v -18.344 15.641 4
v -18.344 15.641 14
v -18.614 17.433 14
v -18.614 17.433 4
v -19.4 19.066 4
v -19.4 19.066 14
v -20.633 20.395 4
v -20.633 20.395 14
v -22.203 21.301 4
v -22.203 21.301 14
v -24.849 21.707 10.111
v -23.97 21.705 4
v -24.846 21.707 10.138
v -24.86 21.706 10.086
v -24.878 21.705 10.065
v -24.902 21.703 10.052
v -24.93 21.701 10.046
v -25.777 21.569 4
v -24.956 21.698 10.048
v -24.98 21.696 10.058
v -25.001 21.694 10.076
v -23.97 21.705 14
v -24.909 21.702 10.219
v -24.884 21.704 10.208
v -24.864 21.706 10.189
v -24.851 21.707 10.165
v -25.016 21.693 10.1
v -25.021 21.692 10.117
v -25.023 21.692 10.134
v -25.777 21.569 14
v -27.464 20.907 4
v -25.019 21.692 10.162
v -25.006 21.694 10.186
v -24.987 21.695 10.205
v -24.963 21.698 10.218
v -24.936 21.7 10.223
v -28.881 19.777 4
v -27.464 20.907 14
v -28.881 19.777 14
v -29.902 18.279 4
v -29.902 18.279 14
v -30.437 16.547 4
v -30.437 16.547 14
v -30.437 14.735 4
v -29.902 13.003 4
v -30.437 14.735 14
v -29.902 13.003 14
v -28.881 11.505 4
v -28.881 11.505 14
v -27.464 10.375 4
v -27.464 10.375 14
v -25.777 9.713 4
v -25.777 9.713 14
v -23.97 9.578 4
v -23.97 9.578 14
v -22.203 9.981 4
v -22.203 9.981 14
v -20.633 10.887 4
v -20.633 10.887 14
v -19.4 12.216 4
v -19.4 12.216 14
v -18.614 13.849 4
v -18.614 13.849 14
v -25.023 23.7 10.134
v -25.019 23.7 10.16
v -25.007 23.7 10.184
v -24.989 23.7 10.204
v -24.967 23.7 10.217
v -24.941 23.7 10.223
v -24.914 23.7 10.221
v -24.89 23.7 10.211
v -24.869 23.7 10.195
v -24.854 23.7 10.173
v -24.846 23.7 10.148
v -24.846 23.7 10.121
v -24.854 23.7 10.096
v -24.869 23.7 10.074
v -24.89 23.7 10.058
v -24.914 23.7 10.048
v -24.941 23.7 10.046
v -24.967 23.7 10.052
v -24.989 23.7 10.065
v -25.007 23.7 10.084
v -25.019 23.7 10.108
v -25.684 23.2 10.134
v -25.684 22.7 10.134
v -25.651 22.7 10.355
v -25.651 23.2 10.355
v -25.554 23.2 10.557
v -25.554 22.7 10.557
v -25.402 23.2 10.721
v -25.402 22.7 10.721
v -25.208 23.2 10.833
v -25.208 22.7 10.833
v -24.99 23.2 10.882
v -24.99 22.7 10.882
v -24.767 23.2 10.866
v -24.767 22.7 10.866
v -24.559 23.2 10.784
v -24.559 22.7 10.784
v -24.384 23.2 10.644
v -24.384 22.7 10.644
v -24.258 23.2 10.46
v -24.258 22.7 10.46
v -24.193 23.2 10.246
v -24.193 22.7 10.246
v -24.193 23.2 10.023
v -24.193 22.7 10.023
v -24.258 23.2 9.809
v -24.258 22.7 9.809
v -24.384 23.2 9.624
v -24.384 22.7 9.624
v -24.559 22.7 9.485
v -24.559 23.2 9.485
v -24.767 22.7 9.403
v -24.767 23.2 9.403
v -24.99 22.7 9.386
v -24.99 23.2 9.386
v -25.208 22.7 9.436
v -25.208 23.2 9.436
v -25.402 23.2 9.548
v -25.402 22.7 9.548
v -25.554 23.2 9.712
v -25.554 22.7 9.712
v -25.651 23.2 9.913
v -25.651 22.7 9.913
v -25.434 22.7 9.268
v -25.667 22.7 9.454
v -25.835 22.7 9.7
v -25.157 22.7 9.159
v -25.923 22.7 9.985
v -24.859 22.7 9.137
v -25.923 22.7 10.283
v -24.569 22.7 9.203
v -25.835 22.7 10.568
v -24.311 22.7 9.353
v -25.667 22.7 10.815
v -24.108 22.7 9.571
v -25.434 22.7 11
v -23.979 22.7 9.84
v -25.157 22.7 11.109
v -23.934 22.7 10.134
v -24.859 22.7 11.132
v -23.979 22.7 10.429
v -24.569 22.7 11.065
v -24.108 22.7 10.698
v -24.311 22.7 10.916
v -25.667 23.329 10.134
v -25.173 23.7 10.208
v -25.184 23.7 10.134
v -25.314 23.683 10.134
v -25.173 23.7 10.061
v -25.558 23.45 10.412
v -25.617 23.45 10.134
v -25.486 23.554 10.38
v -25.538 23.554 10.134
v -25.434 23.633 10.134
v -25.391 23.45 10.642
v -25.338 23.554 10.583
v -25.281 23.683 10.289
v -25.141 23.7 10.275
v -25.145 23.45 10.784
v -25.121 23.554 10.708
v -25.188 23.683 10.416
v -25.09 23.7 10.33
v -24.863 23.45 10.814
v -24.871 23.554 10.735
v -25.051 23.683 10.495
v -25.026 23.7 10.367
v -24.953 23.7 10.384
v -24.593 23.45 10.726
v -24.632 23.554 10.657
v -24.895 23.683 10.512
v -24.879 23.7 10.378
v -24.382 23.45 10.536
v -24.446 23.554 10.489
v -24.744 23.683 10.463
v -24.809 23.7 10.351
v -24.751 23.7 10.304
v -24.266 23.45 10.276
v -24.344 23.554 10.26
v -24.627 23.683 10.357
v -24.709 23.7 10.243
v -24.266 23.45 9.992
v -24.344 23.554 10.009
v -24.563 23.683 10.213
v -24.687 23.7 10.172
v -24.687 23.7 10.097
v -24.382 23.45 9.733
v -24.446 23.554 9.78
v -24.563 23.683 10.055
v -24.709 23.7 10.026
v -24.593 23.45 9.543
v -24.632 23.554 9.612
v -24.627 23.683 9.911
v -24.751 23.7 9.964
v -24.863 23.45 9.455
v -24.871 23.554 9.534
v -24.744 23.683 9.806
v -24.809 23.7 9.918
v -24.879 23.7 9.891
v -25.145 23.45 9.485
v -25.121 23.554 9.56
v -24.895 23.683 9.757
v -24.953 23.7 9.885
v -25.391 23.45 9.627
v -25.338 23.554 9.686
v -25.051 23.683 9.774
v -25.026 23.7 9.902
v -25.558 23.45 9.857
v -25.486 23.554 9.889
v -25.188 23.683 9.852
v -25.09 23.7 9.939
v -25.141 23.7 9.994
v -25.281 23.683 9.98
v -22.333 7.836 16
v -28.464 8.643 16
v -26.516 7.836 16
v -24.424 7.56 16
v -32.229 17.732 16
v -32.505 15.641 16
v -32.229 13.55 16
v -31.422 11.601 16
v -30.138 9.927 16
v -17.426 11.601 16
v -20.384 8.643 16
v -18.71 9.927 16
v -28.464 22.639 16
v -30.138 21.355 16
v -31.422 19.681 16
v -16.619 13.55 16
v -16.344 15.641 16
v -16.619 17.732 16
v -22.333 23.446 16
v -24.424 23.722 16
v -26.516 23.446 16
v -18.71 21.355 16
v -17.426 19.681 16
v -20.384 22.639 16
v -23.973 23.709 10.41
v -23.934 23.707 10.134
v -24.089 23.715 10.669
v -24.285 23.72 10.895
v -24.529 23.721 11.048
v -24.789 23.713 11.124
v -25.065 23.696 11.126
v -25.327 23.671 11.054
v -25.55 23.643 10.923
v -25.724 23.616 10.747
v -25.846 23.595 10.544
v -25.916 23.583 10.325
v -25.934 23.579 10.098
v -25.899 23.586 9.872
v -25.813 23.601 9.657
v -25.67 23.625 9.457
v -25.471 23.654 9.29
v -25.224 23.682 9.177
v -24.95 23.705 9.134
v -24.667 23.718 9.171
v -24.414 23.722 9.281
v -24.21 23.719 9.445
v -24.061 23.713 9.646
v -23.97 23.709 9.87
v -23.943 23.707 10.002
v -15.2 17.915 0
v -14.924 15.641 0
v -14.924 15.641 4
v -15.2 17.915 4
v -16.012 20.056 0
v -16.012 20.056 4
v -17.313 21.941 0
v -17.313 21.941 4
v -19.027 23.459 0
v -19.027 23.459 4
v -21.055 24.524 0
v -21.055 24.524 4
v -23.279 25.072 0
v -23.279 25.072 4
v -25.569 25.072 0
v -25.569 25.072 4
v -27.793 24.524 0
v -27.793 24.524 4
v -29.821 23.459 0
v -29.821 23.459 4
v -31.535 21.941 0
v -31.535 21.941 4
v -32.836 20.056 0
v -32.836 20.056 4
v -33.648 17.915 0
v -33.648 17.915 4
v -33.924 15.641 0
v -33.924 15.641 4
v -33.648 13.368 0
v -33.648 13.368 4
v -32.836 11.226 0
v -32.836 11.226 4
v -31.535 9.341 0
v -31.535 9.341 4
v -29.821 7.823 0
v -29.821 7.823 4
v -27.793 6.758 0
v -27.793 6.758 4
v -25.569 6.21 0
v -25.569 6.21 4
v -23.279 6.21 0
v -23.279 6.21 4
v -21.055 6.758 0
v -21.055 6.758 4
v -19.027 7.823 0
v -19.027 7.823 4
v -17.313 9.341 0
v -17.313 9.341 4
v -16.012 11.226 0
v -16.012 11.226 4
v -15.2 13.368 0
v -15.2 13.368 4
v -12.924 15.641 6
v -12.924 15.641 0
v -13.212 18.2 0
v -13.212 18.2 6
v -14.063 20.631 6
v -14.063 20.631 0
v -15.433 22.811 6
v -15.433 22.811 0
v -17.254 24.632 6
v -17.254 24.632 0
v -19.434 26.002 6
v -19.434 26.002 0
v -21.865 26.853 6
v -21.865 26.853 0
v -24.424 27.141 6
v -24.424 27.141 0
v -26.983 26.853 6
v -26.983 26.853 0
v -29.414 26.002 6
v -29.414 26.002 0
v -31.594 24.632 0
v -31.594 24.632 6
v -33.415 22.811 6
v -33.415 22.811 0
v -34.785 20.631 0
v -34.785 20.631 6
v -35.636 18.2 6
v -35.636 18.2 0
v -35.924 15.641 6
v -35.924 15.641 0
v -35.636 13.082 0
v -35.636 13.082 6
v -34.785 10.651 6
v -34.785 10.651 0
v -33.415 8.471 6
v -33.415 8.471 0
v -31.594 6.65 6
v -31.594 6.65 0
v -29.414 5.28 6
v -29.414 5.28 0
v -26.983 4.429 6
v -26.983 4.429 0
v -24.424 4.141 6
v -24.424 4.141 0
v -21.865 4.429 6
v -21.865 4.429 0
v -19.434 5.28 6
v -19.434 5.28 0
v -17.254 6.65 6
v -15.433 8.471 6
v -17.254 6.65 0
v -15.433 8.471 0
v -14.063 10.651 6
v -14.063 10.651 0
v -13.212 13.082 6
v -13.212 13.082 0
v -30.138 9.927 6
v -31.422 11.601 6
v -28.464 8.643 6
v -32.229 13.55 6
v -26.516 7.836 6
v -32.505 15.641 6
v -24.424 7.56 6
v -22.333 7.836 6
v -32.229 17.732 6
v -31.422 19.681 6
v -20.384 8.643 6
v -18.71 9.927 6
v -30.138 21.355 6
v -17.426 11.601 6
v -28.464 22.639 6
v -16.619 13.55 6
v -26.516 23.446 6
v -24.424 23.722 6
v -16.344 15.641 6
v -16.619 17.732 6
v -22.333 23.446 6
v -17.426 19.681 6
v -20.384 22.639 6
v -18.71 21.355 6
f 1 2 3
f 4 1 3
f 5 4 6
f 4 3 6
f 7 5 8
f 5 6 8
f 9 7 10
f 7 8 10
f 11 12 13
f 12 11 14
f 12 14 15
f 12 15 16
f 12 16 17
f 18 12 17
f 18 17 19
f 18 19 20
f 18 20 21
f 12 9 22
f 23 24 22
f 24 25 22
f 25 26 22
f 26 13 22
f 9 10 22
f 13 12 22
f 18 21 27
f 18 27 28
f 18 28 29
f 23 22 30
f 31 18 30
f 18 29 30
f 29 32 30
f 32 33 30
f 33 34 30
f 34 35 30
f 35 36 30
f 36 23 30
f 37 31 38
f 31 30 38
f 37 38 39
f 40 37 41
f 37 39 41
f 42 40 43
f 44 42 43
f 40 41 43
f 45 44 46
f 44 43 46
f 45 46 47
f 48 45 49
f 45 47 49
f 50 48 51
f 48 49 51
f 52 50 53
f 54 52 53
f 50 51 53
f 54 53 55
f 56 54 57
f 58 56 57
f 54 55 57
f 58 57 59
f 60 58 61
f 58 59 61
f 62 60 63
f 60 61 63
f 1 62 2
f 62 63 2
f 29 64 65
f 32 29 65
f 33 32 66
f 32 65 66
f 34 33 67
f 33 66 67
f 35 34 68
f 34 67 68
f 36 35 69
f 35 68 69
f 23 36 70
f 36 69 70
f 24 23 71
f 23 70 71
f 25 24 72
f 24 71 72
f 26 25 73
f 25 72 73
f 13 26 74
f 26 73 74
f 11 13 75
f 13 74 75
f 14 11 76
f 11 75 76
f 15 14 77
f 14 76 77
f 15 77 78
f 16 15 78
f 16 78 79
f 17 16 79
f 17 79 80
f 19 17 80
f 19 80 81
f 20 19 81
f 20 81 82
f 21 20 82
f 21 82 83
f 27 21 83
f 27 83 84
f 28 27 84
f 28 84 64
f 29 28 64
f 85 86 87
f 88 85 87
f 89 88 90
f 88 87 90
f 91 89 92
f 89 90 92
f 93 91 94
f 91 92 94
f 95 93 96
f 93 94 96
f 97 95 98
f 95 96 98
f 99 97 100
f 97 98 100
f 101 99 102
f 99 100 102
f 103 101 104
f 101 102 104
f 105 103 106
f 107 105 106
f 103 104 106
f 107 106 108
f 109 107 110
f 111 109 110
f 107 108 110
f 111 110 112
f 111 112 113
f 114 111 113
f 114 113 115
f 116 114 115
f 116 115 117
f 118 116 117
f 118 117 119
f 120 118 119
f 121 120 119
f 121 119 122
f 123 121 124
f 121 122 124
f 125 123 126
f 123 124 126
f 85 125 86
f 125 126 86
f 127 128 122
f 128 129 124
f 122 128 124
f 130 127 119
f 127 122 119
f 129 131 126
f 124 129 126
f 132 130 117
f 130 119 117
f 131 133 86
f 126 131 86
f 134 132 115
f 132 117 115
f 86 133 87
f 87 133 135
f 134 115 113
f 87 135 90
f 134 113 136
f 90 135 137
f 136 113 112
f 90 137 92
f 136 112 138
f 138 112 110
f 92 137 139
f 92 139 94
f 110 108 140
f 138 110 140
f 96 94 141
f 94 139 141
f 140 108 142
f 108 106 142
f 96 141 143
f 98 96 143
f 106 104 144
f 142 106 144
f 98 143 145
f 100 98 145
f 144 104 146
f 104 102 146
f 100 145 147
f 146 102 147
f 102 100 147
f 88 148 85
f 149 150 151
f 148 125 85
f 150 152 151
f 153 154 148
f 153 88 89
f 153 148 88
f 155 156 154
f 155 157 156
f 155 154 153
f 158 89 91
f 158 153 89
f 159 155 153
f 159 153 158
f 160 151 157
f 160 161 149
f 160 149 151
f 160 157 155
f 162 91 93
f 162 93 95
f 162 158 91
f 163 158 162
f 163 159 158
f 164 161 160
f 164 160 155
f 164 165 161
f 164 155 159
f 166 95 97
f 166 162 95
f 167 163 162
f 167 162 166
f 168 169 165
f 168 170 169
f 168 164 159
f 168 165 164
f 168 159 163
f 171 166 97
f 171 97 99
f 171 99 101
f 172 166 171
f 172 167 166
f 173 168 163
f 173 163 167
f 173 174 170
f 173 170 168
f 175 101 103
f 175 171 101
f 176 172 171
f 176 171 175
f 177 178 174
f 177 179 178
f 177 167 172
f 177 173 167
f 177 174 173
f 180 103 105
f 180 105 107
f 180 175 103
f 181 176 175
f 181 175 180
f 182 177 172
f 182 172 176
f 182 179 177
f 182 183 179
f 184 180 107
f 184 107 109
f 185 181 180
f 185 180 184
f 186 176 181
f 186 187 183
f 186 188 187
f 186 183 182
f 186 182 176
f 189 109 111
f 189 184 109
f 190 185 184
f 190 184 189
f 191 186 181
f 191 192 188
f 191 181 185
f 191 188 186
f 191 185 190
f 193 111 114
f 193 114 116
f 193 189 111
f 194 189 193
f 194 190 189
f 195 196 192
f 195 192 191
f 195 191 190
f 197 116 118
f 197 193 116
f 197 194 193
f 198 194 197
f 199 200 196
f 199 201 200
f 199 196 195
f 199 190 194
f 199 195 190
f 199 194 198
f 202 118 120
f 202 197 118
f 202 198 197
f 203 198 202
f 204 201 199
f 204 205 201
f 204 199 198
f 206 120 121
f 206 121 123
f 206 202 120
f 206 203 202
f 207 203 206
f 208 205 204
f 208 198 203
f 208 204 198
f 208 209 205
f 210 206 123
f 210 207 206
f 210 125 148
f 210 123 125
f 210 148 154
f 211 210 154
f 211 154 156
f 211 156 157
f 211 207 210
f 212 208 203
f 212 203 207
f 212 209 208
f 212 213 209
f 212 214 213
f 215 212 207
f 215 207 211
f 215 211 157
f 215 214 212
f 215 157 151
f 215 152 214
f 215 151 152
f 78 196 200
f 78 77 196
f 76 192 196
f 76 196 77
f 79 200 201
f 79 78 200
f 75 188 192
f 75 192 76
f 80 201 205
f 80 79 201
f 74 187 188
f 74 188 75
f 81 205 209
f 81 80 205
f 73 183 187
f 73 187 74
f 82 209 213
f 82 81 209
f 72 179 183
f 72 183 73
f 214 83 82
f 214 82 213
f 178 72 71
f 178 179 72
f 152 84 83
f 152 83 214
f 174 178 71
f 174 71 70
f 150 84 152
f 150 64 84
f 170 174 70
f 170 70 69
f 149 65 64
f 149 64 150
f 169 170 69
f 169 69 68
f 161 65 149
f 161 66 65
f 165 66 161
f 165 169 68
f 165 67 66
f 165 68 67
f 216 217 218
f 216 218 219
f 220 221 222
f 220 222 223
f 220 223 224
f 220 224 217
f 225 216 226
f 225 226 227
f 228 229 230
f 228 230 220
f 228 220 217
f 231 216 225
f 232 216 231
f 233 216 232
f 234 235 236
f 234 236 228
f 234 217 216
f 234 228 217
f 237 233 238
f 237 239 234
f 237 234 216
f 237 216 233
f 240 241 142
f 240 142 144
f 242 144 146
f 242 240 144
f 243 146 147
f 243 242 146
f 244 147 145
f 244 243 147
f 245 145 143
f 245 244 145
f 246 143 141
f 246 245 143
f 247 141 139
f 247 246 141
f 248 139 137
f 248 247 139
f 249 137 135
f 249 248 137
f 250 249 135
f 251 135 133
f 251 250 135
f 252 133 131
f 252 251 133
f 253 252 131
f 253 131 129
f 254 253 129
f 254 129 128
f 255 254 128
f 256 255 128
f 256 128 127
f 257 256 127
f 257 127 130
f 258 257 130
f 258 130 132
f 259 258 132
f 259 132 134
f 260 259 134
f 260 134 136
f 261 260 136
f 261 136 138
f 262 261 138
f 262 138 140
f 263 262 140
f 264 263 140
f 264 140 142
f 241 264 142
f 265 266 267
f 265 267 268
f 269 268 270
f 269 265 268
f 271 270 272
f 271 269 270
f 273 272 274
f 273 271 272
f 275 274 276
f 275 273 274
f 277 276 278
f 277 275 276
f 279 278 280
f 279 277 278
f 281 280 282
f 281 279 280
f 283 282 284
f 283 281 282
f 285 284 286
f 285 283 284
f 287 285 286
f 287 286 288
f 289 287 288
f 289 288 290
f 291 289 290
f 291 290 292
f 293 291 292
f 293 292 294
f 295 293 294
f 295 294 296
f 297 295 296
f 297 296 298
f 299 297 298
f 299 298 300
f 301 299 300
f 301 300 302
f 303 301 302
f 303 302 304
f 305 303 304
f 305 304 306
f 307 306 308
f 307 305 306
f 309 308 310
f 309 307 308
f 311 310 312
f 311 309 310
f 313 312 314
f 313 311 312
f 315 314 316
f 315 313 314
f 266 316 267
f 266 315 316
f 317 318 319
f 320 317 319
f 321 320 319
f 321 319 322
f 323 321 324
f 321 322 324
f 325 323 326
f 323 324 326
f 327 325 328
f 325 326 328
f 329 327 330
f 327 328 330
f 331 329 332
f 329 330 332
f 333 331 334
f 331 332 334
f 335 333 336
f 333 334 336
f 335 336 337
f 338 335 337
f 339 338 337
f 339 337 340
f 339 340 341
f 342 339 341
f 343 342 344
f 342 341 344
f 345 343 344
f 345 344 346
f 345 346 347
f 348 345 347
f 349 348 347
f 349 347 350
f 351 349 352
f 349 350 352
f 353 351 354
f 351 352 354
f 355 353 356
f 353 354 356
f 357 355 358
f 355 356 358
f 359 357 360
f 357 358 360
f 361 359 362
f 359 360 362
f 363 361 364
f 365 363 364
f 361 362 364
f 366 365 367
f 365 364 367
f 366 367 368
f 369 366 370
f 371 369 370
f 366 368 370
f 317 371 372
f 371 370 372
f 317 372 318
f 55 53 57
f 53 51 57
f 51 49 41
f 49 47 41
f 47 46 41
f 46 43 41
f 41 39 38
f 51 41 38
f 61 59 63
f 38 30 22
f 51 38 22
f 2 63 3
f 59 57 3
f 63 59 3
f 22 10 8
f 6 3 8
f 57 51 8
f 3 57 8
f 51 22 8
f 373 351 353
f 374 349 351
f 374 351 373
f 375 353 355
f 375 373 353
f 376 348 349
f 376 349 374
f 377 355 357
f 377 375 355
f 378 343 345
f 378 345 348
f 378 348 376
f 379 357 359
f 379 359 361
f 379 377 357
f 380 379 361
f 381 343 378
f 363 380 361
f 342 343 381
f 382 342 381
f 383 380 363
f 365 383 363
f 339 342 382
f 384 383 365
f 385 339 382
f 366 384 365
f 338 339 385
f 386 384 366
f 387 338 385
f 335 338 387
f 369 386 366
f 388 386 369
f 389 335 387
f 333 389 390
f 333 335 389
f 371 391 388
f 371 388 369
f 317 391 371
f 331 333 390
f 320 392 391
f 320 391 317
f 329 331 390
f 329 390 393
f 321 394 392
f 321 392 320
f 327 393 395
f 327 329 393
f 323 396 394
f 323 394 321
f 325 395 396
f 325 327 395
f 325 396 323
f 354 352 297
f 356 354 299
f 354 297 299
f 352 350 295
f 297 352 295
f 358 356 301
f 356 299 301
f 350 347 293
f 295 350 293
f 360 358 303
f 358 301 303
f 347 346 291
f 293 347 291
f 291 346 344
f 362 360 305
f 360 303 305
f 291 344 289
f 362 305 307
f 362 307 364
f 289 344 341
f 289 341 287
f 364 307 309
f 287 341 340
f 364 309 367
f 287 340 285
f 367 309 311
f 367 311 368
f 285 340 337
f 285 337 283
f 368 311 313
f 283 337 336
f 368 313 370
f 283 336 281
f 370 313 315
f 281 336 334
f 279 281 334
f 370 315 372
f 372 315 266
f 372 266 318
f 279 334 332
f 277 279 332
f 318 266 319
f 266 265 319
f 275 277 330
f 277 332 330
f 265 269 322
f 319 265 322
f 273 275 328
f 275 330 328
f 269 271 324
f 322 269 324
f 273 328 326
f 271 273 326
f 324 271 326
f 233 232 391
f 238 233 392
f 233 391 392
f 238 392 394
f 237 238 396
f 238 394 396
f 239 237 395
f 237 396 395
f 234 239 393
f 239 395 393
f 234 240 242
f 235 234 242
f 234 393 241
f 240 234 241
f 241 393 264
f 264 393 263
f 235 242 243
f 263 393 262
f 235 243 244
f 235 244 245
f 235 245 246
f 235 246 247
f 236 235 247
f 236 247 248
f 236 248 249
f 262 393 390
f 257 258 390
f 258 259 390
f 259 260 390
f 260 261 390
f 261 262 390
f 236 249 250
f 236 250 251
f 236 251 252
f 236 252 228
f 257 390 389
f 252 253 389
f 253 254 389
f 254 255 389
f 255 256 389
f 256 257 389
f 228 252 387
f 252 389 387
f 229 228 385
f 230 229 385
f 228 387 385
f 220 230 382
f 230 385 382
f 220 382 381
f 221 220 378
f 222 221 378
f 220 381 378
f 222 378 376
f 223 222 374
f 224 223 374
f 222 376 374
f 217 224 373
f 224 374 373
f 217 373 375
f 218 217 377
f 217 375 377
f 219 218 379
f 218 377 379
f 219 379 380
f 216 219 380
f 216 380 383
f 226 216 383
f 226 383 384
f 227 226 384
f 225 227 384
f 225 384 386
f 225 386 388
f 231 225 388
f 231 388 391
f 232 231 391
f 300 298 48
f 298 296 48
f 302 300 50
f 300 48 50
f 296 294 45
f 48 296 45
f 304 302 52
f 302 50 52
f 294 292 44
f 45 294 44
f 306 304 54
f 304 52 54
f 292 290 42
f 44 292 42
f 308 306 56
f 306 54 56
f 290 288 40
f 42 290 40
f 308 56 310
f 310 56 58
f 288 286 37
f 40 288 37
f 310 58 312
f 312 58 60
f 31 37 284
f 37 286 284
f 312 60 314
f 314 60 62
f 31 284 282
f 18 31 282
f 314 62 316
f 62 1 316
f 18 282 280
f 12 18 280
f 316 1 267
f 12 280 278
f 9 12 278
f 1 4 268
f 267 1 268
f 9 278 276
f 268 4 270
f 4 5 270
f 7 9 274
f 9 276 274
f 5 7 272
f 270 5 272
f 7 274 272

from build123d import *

# Parameters (mm, degrees)
F0_R      = 11.5
F1_DEPTH  = 6
F2_T      = -2
F3_R      = 8.0805542871
F4_DEPTH  = 10
F5_T      = 2
F7_R      = 1
F8_DEPTH  = 7
F9_R      = 0.75
F10_DEPTH = 1
F11_R     = 0.5
F12_R     = 0.0887059055
F13_DEPTH = 7


# Not quite as in the source:
# - a shell that OpenCascade refuses in one call is made with other operations: the cavity is built on its own and cut out


with BuildPart() as f1:
    # F0 (on Top) → F1 (new body)
    with BuildSketch(Plane.XY):
        with Locations((-24.4241058826, 15.6410522759)):
            Circle(F0_R)
    extrude(amount=F1_DEPTH)

    # F2
    f2_openings = [f1.faces().sort_by_distance(p)[0] for p in [
        (-24.424106, 15.641052, 0),
    ]]
    offset(amount=F2_T, openings=f2_openings)

    # F3 (on face) → F4 (join)
    with BuildSketch(Plane.XY.offset(6)):
        with Locations((-24.4241058826, 15.6410522759)):
            Circle(F3_R)
    extrude(amount=F4_DEPTH)

    # F5: shell of thickness 2, made by hand


with BuildPart() as f5_core1:
    # F5_t2: copy of F1
    add(f1.part)

    # the walls: a layer under each face that stays
    f5_faces = [f5_core1.faces().sort_by_distance(p)[0] for p in [
        (-35.9241058826, 15.6410522759, 3),
        (-32.0907725493, 7.9743856092, 0),
        (-32.0907725493, 7.9743856092, 6),
        (-33.9241058826, 15.6410522759, 2),
        (-32.5046601698, 15.6410522759, 11),
        (-24.4241058826, 15.6410522759, 16),
    ]]
    thicken(f5_faces, amount=-F5_T, mode=Mode.SUBTRACT)

    # F5_s3 → F5_t4 (revolve, cut)
    with BuildSketch(Plane.XZ.offset(-15.6410522759)):
        Polygon((-16.3235515955, 6.02), (-16.3435515955, 4), (-18.3435515955, 4), (-18.3435515955, 6), align=None)
    revolve(axis=Axis((-24.4241058826, 15.6410522759, 6), (0, 0, 1)), mode=Mode.SUBTRACT)


with BuildPart() as f1_1:
    add(f1.part)

    # what is left inside the walls is the cavity
    f5_cavity = [f5_core1.part.solids().sort_by_distance(p)[0] for p in [
        (-30.48466, 15.641052, 11.333333),
    ]]
    add(f5_cavity, mode=Mode.SUBTRACT)

    # F7 (on offset) → F8 (cut)
    with BuildSketch(Plane.XZ.offset(-29.7)):
        with Locations((-24.9341819435, 10.1343514398)):
            Circle(F7_R)
    extrude(amount=F8_DEPTH, mode=Mode.SUBTRACT)

    # F9 (on face) → F10 (join)
    with BuildSketch(Plane(origin=(0, 22.7, 0), x_dir=(-1, 0, 0), z_dir=(0, 1, 0))):
        with Locations((24.9341819435, 10.1343514398)):
            Circle(F9_R)
    extrude(amount=F10_DEPTH)

    # F11
    f11_edges = [f1_1.edges().sort_by_distance(p)[0] for p in [
        (-24.184182, 23.7, 10.134351),
    ]]
    fillet(f11_edges, radius=F11_R)

    # F12 (on face) → F13 (cut)
    with BuildSketch(Plane(origin=(0, 23.7, 0), x_dir=(-1, 0, 0), z_dir=(0, 1, 0))):
        with Locations((24.9341819435, 10.1343514398)):
            Circle(F12_R)
    extrude(amount=-F13_DEPTH, mode=Mode.SUBTRACT)


solid = f1_1.part
